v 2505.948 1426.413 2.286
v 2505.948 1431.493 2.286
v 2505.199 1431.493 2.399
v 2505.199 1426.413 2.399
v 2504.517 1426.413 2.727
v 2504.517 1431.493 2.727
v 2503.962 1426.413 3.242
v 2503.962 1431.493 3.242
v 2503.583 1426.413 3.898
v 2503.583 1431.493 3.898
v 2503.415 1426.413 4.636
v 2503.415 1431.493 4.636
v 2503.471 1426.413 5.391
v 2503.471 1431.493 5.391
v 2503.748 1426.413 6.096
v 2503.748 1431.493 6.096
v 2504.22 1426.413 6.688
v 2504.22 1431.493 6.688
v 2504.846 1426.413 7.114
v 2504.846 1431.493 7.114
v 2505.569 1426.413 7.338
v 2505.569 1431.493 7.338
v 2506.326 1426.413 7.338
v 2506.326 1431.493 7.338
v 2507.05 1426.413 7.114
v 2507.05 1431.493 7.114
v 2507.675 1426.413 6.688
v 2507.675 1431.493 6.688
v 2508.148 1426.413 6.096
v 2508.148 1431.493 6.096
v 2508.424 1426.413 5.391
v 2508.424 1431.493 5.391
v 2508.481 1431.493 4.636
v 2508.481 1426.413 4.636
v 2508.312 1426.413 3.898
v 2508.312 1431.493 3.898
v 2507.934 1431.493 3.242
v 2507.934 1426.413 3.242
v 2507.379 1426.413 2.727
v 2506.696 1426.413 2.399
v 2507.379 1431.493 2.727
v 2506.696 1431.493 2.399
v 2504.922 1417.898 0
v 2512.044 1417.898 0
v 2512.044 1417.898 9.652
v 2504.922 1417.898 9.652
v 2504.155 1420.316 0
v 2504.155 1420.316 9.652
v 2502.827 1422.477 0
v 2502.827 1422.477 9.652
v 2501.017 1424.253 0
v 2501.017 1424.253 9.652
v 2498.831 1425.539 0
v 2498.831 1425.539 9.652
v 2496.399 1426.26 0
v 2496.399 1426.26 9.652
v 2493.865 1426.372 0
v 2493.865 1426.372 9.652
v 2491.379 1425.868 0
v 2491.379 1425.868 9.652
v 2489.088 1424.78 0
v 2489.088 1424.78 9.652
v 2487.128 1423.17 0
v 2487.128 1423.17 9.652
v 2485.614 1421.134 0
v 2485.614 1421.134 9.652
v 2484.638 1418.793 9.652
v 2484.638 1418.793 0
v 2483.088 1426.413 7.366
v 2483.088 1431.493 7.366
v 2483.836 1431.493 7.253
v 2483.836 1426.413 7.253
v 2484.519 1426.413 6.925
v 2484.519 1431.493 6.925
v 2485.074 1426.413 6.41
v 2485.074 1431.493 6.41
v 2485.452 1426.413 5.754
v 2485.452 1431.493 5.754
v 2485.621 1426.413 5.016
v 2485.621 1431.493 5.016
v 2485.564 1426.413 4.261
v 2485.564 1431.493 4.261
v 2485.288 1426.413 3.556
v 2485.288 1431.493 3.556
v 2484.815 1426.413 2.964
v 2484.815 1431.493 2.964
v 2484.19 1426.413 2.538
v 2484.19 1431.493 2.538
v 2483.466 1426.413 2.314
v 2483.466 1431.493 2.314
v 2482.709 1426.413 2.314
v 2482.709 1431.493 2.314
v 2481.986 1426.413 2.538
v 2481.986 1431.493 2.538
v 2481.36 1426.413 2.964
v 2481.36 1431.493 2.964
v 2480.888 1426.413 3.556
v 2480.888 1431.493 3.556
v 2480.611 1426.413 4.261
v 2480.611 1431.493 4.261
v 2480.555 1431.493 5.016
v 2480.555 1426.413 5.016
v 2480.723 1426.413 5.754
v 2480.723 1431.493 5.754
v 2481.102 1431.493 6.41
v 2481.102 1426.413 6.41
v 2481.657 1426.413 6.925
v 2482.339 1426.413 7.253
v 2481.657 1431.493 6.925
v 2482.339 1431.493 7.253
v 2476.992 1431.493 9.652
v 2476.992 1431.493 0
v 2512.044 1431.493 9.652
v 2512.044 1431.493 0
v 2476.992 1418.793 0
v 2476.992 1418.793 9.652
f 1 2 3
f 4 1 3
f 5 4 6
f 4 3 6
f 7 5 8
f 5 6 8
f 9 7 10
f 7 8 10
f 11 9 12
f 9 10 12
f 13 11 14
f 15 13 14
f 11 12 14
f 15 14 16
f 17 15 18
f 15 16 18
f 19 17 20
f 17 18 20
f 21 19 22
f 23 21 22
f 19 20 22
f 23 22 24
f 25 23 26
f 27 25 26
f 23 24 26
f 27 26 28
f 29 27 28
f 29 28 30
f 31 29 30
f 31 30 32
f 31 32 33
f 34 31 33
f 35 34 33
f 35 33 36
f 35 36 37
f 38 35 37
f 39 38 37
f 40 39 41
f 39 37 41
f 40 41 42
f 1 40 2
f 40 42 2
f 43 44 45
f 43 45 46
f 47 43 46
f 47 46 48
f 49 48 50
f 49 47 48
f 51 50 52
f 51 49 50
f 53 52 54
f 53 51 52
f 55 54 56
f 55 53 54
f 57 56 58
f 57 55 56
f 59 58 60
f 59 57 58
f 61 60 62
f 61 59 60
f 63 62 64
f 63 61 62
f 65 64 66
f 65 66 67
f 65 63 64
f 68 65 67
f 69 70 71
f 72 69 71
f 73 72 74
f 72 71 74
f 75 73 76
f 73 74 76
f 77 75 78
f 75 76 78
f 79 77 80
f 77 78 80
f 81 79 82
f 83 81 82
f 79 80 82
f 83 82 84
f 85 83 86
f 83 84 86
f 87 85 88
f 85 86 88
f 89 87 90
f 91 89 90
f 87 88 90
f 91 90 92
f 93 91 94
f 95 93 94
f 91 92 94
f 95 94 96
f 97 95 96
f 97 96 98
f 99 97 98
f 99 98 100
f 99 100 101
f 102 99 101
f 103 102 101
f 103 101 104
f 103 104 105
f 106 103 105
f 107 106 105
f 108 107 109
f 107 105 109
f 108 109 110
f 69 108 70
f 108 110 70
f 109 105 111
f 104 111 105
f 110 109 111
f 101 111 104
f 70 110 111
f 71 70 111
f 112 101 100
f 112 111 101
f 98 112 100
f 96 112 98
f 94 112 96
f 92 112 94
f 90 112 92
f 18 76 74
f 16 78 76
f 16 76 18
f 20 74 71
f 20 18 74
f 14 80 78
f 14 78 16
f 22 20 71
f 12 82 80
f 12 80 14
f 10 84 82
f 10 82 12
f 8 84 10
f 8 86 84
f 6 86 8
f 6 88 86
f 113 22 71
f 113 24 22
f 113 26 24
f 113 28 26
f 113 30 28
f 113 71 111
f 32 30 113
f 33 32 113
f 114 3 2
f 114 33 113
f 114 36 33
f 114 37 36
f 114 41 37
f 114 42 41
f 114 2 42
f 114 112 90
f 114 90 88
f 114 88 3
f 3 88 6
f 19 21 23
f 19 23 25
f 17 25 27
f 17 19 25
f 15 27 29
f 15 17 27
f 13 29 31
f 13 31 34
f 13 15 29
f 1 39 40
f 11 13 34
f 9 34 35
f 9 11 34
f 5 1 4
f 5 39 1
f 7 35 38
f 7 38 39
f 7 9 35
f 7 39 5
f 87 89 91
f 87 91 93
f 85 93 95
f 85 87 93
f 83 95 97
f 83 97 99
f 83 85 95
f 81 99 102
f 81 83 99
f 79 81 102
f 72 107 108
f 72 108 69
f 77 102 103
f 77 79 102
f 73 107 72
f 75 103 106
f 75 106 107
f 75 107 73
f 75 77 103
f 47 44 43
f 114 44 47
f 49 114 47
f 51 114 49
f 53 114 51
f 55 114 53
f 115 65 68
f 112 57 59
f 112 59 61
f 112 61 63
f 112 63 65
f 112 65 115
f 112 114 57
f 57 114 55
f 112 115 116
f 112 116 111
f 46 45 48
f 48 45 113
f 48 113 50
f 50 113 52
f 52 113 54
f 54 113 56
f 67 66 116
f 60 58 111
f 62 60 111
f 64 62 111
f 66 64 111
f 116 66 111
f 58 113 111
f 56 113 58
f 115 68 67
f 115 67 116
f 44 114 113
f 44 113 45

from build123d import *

# Parameters (mm, degrees)
BOSS_EXTRUDE1_DEPTH = 9.652
SKETCH2_R           = 2.54
CUT_EXTRUDE1_DEPTH  = 5.08


with BuildPart() as part:
    # Sketch1 → Boss-Extrude1 (new body)
    with BuildSketch(Plane.XY):
        with BuildLine():
            Line((2476.991807356, 1418.793197854), (2476.991807356, 1431.493197854))
            Line((2476.991807356, 1431.493197854), (2512.043807356, 1431.493197854))
            Line((2512.043807356, 1431.493197854), (2512.043807356, 1417.89780113))
            Line((2512.043807356, 1417.89780113), (2504.92216143, 1417.89780113))
            ThreePointArc((2504.92216143, 1417.89780113), (2495.135108983, 1426.393265728), (2484.637572003, 1418.793197854))
            Line((2484.637572003, 1418.793197854), (2476.991807356, 1418.793197854))
        make_face()
    extrude(amount=BOSS_EXTRUDE1_DEPTH)

    # Sketch2 → Cut-Extrude1 (cut)
    with BuildSketch(Plane(origin=(0, 1431.493197854, 0), x_dir=(1, 0, 0), z_dir=(0, 1, 0))):
        with Locations(Location((2483.087807356, -4.826, 0), (0, 0, 270))):
            Circle(SKETCH2_R)
        with Locations(Location((2505.947807356, -4.826, 0), (0, 0, 90))):
            Circle(SKETCH2_R)
    extrude(amount=-CUT_EXTRUDE1_DEPTH, mode=Mode.SUBTRACT)


solid = part.part
